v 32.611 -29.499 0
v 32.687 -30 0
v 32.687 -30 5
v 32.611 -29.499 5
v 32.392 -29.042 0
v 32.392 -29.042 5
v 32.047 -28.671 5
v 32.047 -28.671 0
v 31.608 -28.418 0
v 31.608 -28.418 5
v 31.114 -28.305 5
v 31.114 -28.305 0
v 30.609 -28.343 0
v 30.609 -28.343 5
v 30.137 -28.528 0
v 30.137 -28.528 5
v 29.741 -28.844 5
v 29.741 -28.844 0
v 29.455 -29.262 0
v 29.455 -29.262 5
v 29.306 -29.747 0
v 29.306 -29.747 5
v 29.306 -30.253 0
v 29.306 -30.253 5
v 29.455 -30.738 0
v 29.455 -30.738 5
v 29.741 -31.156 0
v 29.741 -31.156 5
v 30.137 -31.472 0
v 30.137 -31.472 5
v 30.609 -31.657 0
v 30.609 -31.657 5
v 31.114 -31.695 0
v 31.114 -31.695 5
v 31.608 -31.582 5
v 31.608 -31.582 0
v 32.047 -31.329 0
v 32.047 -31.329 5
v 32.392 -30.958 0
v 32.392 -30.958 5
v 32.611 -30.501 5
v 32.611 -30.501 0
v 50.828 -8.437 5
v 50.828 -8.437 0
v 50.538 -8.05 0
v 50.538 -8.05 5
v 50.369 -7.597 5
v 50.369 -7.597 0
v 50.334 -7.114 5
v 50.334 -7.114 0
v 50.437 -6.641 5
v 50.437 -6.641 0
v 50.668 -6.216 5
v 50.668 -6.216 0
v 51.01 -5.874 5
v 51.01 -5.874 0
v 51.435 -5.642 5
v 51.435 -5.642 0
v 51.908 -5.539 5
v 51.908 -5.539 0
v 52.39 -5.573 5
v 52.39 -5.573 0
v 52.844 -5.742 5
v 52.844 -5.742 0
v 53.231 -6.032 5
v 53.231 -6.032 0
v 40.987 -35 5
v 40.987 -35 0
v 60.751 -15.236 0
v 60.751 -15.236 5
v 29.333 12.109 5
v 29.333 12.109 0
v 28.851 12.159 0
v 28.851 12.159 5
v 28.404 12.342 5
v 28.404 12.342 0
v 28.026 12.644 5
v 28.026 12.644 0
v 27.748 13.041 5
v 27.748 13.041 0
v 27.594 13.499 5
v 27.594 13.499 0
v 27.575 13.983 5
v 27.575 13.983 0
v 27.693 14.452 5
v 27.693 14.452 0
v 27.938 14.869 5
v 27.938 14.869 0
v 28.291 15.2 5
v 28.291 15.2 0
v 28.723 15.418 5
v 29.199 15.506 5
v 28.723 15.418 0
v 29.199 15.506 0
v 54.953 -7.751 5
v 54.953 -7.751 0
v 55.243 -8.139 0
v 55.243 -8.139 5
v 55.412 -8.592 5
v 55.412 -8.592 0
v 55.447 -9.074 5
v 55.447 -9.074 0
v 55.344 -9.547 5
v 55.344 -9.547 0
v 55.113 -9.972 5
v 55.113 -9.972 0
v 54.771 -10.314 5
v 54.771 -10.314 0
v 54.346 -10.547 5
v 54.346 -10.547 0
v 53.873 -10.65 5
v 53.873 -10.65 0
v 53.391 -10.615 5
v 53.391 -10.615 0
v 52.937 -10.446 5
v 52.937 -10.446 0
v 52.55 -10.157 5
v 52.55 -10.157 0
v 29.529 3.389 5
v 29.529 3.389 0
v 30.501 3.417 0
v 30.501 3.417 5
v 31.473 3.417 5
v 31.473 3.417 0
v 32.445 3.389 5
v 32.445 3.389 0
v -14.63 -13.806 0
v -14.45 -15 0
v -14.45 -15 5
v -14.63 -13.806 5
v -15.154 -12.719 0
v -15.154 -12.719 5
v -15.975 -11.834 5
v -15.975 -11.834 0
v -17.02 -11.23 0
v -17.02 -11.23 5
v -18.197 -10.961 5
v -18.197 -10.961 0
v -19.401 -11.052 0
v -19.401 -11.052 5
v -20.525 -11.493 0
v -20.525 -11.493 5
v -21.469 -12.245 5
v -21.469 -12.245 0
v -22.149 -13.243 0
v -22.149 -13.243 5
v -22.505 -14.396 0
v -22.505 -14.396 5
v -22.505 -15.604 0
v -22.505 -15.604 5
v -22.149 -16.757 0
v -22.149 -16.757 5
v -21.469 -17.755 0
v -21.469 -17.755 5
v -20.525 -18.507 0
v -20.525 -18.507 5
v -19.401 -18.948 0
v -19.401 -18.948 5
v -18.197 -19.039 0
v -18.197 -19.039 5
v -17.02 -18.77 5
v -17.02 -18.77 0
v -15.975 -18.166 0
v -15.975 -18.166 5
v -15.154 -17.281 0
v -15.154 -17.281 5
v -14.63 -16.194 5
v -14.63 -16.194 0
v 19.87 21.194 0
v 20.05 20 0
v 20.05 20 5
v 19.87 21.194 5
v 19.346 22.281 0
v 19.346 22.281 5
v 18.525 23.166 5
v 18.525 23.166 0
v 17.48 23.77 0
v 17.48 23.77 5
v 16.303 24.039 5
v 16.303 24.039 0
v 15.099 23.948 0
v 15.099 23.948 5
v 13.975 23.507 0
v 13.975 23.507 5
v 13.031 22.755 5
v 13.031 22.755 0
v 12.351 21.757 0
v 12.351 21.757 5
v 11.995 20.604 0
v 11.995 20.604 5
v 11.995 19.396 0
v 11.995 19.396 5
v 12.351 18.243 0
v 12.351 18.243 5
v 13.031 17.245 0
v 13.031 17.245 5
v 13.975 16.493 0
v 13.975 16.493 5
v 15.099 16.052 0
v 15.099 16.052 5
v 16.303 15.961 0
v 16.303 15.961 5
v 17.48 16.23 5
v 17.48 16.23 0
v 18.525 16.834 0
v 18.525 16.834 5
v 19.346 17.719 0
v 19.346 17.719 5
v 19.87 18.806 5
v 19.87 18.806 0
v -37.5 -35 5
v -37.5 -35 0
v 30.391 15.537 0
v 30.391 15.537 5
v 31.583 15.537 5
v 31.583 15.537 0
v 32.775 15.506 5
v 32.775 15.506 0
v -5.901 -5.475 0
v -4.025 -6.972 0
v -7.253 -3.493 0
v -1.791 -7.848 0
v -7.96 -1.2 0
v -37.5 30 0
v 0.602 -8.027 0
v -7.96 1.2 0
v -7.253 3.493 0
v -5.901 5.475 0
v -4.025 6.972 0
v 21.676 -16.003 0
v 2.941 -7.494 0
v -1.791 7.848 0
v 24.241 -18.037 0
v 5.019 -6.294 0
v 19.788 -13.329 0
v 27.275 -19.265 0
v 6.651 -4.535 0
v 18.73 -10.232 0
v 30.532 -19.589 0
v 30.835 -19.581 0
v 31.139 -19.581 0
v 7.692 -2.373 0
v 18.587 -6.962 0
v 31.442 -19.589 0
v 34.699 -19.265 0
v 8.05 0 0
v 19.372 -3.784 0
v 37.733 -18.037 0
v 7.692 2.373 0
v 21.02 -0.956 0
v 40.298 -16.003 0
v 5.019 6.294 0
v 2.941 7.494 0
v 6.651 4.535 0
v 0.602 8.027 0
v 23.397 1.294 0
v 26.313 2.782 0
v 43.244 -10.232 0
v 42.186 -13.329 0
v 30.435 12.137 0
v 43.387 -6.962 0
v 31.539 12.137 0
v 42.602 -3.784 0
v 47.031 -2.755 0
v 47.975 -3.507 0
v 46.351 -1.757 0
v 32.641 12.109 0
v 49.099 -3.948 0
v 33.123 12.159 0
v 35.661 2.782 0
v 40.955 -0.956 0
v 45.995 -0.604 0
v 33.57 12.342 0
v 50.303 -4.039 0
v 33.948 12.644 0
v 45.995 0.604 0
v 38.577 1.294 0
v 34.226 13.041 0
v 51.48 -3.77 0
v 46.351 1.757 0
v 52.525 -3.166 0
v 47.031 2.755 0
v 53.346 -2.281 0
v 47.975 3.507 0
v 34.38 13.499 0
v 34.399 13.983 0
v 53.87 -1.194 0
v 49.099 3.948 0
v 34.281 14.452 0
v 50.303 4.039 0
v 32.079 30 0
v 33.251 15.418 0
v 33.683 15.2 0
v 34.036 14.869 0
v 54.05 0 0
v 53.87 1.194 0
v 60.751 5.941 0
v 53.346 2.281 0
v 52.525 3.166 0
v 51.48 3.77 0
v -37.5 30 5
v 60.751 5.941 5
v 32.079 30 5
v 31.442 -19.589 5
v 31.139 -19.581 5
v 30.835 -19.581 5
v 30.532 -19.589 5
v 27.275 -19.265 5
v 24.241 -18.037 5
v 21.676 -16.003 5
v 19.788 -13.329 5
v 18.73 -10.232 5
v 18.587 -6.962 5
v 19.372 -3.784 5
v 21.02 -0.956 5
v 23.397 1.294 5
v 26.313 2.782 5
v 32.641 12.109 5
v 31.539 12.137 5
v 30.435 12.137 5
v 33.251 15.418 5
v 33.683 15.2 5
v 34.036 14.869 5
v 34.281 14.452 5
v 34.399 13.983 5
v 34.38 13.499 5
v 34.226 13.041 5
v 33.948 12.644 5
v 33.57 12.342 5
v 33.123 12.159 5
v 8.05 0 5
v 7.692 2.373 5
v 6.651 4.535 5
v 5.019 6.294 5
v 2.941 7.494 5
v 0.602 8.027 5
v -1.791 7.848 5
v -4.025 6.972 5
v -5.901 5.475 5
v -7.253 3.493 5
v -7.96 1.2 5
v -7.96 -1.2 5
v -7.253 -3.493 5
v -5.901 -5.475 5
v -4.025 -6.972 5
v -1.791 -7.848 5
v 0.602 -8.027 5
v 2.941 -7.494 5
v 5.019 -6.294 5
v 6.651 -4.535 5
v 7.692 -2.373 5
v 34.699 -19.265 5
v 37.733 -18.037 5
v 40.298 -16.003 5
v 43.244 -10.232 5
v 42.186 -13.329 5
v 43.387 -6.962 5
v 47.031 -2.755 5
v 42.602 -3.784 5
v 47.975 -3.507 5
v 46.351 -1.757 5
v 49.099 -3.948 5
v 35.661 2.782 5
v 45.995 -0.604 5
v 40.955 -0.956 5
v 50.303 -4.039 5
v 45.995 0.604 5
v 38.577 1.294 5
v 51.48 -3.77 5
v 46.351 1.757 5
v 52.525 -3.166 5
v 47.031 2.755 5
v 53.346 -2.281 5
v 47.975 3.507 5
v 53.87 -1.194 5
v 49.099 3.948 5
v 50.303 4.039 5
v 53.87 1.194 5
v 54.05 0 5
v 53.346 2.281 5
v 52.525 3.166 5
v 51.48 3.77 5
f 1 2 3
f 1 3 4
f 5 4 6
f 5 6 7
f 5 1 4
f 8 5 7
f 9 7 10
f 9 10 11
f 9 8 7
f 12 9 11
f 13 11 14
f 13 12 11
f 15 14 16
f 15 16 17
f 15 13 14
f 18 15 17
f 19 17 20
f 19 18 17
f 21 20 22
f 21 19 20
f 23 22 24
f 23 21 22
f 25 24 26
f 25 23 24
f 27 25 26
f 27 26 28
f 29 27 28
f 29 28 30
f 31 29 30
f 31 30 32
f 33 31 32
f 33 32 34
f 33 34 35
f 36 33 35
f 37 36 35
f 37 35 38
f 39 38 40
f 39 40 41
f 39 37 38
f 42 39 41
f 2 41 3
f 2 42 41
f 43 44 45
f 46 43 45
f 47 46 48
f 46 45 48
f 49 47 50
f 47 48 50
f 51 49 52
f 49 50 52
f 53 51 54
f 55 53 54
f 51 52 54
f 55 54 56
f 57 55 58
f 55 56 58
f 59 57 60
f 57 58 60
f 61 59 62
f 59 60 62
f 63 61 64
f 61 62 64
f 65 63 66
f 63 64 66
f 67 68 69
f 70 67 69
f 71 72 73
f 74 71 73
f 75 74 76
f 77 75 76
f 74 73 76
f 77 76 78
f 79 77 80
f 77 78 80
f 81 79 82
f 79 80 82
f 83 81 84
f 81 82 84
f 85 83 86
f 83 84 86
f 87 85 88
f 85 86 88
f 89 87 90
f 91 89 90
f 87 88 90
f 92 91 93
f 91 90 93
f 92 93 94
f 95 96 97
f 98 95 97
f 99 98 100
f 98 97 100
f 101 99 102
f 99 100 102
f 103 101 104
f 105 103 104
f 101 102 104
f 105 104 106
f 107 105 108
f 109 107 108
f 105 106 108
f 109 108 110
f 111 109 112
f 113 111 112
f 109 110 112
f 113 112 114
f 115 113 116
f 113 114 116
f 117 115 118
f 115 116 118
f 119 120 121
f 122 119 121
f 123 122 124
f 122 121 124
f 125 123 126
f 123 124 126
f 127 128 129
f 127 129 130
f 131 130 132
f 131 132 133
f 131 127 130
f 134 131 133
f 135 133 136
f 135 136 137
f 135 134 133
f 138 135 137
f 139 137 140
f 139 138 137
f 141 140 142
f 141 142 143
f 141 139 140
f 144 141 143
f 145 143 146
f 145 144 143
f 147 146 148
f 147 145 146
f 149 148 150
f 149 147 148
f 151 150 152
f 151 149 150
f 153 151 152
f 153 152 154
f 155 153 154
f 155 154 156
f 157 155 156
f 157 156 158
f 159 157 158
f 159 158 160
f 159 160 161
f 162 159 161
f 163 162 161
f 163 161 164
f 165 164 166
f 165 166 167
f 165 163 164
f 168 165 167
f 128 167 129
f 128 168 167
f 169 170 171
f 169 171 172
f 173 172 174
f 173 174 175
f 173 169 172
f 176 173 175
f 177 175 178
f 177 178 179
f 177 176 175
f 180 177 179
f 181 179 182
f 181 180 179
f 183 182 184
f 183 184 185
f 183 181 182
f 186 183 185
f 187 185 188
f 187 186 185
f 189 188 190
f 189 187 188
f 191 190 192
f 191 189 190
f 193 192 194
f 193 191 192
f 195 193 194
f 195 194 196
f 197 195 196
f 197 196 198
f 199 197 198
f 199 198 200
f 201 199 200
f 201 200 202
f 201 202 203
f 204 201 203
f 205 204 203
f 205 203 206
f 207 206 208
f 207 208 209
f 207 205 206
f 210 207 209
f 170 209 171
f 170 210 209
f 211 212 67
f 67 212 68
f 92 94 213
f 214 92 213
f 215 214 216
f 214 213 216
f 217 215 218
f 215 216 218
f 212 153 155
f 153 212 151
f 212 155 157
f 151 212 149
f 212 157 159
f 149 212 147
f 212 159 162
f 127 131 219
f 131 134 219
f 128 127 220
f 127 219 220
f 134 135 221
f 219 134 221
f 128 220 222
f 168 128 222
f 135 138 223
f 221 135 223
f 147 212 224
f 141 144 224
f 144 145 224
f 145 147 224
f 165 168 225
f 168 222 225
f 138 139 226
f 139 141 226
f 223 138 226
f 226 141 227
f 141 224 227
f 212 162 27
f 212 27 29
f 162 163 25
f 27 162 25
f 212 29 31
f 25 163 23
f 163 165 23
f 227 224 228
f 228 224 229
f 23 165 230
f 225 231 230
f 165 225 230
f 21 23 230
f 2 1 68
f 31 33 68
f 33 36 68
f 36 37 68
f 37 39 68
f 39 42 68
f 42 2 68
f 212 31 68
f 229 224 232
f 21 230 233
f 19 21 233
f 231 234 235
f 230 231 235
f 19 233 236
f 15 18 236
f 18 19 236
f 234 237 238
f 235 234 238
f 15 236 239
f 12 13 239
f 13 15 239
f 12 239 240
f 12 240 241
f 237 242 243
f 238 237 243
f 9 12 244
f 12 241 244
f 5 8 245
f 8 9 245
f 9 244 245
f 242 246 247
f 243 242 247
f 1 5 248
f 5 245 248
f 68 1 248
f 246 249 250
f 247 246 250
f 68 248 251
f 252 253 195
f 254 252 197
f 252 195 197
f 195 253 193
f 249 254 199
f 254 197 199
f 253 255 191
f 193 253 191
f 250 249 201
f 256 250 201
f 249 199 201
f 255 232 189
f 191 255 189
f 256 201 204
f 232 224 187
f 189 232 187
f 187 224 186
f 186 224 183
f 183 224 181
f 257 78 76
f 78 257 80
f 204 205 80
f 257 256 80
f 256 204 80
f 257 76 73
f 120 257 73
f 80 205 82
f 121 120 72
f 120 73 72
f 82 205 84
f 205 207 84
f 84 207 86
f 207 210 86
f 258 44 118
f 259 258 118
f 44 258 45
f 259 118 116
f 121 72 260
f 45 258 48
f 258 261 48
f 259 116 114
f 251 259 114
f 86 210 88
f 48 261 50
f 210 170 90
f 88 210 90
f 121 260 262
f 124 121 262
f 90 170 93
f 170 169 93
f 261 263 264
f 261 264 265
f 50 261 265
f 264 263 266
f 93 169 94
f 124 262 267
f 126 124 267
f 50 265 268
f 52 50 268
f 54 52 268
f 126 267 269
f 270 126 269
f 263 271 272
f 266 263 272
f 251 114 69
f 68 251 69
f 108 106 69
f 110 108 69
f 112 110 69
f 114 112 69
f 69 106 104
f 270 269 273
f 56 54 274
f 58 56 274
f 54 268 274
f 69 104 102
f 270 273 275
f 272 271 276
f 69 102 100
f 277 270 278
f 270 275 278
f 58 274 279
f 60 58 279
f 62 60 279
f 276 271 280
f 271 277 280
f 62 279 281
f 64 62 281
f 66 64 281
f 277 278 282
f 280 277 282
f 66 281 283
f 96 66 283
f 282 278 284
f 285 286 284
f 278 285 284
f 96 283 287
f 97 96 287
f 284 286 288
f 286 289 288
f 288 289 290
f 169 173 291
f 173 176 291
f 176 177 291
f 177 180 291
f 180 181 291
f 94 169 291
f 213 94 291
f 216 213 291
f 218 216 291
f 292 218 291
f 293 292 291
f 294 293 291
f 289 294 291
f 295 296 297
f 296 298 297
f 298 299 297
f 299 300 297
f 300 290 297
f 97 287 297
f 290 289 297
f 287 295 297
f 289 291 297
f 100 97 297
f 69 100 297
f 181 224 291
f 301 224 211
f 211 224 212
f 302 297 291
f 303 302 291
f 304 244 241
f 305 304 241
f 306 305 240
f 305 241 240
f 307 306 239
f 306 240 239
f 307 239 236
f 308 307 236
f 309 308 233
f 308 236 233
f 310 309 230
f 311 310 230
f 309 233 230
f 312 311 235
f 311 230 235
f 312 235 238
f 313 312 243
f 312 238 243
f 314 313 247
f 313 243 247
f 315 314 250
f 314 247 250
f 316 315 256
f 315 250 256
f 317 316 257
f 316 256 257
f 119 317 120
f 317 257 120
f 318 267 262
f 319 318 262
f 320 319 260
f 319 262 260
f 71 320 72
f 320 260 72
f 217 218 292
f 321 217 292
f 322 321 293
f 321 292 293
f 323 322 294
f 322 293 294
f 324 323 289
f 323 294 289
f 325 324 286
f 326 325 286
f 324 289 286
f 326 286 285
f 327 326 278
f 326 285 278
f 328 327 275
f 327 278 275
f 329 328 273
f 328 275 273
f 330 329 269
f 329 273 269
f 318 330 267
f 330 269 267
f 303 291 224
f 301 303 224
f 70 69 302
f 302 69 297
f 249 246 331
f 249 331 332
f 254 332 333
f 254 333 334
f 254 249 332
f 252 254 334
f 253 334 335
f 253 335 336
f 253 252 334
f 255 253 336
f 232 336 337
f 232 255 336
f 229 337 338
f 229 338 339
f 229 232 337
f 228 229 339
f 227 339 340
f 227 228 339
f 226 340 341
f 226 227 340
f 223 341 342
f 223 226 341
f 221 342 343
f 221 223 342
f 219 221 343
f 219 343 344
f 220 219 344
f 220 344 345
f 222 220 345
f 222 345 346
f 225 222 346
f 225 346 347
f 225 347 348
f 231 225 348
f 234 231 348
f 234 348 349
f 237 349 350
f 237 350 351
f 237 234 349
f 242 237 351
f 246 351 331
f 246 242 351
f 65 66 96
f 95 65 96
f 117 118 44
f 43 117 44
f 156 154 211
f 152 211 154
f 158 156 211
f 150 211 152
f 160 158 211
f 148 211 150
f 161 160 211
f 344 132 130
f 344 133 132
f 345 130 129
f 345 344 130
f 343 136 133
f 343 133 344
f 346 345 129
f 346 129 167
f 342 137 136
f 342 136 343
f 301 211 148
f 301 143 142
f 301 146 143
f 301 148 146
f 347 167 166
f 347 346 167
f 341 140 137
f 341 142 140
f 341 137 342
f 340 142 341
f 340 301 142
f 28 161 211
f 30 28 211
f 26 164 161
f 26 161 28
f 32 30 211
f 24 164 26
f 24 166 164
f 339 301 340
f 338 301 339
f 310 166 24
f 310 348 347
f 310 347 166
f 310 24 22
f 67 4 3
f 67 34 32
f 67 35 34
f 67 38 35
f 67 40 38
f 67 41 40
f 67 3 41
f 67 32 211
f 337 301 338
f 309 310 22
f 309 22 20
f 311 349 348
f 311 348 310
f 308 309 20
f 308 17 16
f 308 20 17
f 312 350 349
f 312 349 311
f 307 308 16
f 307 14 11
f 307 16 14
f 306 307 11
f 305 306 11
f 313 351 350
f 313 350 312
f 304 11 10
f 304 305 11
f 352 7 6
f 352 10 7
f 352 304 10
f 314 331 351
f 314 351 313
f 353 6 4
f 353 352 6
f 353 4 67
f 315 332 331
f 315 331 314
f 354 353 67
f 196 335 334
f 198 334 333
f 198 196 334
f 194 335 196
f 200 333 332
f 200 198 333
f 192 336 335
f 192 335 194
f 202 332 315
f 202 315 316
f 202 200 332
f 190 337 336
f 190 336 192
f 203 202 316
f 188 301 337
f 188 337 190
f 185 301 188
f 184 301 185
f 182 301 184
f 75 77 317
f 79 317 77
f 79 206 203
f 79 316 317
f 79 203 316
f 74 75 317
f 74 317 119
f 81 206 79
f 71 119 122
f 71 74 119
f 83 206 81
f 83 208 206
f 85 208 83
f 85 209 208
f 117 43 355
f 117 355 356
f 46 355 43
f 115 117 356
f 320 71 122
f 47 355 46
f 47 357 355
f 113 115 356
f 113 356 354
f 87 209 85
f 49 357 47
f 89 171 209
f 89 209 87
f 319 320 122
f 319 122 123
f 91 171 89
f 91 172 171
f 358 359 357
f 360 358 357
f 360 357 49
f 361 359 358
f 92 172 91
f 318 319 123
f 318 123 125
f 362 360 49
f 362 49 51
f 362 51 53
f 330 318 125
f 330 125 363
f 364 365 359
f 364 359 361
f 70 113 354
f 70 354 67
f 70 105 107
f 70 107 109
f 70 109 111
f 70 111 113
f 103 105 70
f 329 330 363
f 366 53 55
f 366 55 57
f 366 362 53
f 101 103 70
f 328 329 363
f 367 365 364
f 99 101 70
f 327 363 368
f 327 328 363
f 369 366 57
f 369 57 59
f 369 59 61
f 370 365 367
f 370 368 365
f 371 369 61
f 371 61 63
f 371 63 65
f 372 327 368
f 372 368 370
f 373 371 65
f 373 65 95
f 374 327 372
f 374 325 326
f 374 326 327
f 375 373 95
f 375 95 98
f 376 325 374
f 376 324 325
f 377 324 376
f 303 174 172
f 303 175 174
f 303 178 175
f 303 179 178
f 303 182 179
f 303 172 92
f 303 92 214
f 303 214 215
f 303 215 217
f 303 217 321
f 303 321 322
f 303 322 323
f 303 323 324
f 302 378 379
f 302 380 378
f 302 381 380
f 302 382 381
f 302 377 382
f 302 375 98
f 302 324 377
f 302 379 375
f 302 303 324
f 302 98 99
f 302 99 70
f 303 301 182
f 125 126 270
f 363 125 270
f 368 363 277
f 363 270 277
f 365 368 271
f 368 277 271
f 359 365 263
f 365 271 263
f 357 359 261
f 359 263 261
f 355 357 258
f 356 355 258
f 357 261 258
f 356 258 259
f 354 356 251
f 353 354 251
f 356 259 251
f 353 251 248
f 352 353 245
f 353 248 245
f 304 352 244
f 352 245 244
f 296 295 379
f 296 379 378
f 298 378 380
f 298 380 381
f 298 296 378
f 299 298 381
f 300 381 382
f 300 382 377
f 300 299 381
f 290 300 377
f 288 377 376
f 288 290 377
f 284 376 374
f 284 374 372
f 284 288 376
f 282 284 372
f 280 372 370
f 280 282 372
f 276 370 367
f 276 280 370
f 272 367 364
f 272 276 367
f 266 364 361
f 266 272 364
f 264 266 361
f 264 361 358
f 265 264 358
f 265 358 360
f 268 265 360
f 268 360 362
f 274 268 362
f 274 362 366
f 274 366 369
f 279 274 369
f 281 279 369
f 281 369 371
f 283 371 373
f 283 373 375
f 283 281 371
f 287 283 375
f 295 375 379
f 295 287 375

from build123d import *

# Parameters (mm, degrees)
SKETCH1_R           = 4.05
SKETCH1_R_2         = 1.7
SKETCH1_R_3         = 8.05
BOSS_EXTRUDE1_DEPTH = 5


with BuildPart() as part:
    # Sketch1 → Boss-Extrude1 (new body)
    with BuildSketch(Plane.XY):
        Polygon((32.079048784, 30), (-37.5, 30), (-37.5, -35), (40.987000641, -35), (60.75120914, -15.235791501), (60.75120914, 5.94120082), align=None)
        with Locations((16, 20)):
            Circle(SKETCH1_R, mode=Mode.SUBTRACT)
        with Locations((50, 0)):
            Circle(SKETCH1_R, mode=Mode.SUBTRACT)
        with Locations((-18.5, -15)):
            Circle(SKETCH1_R, mode=Mode.SUBTRACT)
        with Locations((30.987000641, -30)):
            Circle(SKETCH1_R_2, mode=Mode.SUBTRACT)
        Circle(SKETCH1_R_3, mode=Mode.SUBTRACT)
        with BuildLine():
            Line((53.231228952, -6.031636678), (54.952673272, -7.751314072))
            ThreePointArc((54.952673272, -7.751314072), (54.953907747, -10.155476811), (52.549745008, -10.156711286))
            Line((52.549745008, -10.156711286), (50.828300688, -8.437033892))
            ThreePointArc((50.828300688, -8.437033892), (50.827066213, -6.032871153), (53.231228952, -6.031636678))
        make_face(mode=Mode.SUBTRACT)
        with BuildLine():
            ThreePointArc((29.199069372, 15.505889539), (30.987000641, 15.541), (32.774931911, 15.505889539))
            ThreePointArc((32.774931911, 15.505889539), (34.406879586, 13.740458491), (32.641448537, 12.108510816))
            ThreePointArc((32.641448537, 12.108510816), (30.987000641, 12.141), (29.332552745, 12.108510816))
            ThreePointArc((29.332552745, 12.108510816), (27.567121697, 13.740458491), (29.199069372, 15.505889539))
        make_face(mode=Mode.SUBTRACT)
        with BuildLine():
            ThreePointArc((29.529218906, 3.388691089), (30.987000641, 3.4205), (32.444782377, 3.388691089))
            ThreePointArc((32.444782377, 3.388691089), (43.43221397, -8.601986414), (31.441536467, -19.589418007))
            ThreePointArc((31.441536467, -19.589418007), (30.987000641, -19.5795), (30.532464815, -19.589418007))
            ThreePointArc((30.532464815, -19.589418007), (18.541787312, -8.601986414), (29.529218906, 3.388691089))
        make_face(mode=Mode.SUBTRACT)
    extrude(amount=BOSS_EXTRUDE1_DEPTH)


solid = part.part
